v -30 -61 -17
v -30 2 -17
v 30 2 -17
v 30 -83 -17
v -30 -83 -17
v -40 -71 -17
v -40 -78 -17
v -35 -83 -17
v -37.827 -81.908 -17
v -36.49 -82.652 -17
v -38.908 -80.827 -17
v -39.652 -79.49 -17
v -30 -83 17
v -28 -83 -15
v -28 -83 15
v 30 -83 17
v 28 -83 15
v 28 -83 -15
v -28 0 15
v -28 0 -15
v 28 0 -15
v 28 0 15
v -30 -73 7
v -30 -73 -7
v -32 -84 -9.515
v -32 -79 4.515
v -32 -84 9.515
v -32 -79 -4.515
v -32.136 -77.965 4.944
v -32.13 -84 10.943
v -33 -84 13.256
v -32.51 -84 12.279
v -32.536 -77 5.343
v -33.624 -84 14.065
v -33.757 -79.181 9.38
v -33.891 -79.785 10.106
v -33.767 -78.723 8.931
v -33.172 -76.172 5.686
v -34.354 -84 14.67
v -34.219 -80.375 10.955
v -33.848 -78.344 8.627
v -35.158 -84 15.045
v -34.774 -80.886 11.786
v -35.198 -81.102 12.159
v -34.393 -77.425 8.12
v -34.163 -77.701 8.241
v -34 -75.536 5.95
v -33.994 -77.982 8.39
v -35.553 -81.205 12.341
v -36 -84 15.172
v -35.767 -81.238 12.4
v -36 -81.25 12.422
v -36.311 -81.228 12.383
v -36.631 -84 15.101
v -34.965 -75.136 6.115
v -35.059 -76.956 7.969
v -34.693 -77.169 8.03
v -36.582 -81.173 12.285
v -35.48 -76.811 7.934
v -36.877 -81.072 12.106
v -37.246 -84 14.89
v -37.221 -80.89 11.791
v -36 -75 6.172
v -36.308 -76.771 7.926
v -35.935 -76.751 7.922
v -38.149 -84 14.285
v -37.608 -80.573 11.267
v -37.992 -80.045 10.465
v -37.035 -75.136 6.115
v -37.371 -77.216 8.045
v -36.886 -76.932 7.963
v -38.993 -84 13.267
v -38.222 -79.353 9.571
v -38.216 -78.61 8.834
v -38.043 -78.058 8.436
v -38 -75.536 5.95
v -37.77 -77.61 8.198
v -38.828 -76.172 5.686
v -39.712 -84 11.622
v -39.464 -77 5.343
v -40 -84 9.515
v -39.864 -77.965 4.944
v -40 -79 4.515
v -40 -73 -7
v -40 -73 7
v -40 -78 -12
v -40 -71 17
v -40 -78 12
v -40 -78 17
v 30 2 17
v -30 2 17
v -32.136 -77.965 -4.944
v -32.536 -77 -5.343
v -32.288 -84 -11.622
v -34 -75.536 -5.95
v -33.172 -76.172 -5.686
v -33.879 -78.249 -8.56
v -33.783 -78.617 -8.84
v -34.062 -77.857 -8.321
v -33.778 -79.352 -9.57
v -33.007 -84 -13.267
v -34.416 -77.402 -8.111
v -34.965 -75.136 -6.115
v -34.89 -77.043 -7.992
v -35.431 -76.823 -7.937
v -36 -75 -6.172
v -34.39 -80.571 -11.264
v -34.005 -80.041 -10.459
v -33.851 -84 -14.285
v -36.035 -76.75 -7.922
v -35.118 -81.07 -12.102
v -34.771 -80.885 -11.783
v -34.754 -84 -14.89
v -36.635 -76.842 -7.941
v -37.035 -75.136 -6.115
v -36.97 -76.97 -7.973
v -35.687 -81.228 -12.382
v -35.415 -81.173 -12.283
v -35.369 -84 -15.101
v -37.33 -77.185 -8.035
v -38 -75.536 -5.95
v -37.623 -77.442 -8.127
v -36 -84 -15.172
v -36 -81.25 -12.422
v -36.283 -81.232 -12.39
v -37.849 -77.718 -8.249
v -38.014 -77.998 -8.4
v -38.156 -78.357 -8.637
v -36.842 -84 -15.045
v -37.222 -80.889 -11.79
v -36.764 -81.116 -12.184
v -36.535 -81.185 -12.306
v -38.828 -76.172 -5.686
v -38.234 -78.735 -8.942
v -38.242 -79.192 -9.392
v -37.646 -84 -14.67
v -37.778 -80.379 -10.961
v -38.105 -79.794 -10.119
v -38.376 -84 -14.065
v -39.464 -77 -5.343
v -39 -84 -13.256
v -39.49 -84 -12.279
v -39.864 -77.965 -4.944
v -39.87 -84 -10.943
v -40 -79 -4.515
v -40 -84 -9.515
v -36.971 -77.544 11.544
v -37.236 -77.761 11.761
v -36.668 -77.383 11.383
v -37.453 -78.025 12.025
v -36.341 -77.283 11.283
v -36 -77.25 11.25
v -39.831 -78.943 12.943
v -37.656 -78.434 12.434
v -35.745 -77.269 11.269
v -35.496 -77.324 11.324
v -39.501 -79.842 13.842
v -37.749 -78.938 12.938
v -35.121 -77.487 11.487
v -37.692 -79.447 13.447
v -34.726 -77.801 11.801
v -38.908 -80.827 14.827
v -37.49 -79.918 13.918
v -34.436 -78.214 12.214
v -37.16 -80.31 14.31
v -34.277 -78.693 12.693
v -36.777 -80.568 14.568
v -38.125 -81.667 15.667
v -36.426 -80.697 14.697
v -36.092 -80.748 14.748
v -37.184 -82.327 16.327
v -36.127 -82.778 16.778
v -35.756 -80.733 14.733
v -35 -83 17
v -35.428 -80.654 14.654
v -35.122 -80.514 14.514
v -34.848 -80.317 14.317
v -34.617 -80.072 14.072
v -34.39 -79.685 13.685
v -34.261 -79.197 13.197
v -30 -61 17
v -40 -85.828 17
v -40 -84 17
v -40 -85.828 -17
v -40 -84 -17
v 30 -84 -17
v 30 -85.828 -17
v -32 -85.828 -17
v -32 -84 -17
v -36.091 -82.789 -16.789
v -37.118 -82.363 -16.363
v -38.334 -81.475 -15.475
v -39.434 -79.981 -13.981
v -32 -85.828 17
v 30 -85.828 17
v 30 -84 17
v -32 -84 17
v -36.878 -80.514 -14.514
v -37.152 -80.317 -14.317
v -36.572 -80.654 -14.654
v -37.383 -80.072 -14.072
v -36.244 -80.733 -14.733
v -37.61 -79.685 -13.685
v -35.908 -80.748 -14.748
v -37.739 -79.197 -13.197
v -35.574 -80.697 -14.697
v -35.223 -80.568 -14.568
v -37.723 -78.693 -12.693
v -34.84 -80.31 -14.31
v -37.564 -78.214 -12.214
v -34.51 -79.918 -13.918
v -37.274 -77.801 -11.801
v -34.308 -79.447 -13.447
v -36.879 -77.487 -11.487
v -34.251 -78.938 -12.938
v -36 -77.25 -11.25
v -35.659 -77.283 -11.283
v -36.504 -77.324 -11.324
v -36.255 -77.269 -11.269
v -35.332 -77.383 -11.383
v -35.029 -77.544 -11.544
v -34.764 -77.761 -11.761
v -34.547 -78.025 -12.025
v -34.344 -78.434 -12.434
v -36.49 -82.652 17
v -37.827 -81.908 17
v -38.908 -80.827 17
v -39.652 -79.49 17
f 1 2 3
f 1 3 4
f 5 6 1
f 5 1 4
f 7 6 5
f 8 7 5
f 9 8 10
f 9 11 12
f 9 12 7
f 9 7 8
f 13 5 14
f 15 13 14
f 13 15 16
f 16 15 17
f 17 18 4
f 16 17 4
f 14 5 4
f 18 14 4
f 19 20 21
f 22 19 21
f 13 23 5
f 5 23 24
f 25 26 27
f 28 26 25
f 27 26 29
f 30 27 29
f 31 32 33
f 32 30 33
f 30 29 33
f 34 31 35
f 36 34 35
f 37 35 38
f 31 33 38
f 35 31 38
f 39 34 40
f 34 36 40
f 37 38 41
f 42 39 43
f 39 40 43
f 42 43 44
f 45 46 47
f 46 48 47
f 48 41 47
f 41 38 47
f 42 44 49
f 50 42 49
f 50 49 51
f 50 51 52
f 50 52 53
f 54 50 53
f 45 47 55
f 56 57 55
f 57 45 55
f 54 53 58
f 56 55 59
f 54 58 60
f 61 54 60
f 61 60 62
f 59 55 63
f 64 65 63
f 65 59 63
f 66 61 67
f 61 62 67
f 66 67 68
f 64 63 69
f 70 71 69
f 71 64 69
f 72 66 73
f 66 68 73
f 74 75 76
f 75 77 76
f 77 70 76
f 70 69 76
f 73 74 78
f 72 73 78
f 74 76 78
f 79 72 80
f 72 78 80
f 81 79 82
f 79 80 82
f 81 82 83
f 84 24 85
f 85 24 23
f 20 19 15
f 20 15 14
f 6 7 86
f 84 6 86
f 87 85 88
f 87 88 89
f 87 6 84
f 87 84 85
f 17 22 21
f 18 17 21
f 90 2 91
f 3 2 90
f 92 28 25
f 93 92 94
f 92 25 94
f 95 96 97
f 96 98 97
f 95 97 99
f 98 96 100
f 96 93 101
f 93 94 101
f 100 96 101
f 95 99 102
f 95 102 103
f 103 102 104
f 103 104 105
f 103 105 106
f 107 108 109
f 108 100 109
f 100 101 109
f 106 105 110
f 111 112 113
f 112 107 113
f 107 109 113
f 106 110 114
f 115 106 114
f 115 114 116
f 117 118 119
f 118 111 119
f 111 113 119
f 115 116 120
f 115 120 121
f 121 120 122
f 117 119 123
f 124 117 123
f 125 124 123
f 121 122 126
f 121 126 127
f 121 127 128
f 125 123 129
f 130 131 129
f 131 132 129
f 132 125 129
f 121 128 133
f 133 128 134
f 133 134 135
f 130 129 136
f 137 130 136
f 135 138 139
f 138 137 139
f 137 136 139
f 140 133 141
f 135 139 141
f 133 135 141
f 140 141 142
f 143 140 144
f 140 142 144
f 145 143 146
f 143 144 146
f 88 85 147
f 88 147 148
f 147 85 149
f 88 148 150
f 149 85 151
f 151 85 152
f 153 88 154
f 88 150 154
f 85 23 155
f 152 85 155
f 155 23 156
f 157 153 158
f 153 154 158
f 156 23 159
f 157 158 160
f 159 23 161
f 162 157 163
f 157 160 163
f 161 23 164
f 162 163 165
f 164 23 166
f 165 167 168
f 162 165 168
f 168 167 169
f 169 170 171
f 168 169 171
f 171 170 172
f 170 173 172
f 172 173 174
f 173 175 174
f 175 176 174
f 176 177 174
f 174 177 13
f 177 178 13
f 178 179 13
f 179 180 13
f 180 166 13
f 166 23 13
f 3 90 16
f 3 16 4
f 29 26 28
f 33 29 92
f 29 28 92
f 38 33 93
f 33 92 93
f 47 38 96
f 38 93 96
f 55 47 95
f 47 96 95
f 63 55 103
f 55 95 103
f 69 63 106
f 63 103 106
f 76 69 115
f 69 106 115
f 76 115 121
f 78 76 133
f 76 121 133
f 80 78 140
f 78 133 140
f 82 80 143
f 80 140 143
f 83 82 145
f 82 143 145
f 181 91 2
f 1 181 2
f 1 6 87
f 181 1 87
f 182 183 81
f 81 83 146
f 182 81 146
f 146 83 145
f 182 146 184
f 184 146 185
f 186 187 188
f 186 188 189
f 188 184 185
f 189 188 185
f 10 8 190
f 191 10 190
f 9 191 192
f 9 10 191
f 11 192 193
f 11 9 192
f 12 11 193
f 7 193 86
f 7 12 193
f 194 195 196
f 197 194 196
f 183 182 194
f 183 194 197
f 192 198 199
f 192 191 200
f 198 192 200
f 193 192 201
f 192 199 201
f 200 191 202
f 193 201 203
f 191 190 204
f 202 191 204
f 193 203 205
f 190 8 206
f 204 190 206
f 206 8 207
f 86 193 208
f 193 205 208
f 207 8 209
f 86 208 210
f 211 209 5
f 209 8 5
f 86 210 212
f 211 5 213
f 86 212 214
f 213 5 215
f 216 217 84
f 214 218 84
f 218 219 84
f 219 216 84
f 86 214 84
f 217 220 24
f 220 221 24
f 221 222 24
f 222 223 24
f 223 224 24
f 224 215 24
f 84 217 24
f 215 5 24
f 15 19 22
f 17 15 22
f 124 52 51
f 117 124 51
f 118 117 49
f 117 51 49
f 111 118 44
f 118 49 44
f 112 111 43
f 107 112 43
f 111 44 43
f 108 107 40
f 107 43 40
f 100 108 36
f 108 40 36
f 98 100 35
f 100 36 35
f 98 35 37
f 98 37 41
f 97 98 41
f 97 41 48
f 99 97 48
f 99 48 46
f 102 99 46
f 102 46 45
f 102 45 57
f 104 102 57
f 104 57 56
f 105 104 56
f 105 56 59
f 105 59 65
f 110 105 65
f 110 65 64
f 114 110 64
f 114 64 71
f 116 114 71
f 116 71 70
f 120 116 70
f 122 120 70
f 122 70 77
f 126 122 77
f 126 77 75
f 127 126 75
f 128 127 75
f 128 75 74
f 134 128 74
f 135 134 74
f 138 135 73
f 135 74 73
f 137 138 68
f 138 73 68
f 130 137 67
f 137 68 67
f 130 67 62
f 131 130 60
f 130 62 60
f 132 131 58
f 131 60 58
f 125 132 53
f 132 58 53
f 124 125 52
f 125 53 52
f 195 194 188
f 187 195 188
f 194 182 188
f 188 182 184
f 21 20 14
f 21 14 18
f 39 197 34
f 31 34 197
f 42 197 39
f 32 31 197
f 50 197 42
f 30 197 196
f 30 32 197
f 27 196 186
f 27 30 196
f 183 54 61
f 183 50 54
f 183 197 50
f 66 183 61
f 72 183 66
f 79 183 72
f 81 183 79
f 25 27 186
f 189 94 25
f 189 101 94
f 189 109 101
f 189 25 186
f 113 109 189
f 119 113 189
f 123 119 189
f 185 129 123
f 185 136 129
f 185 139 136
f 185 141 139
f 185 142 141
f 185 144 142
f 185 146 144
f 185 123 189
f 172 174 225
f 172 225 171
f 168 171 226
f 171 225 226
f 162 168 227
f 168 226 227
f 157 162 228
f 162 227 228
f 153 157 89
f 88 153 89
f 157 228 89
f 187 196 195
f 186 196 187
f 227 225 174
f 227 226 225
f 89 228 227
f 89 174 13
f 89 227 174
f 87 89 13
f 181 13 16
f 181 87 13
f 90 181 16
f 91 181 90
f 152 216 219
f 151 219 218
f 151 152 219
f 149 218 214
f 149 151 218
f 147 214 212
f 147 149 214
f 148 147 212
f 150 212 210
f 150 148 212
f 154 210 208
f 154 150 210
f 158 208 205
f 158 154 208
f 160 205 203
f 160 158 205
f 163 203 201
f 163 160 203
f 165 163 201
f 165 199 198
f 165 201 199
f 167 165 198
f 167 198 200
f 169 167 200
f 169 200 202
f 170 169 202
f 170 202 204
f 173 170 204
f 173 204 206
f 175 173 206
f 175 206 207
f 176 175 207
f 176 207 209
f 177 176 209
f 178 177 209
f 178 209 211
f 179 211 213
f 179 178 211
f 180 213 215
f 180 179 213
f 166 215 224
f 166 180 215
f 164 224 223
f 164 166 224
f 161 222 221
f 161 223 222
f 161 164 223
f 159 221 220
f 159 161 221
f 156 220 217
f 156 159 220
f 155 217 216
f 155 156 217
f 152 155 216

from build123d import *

# Parameters (mm, degrees)
SKETCH1_W            = 56
SKETCH1_H            = 30
BOSS_EXTRUDE1_DEPTH  = 2
SKETCH2_W            = 60
SKETCH2_H            = 34
SKETCH2_W_2          = 56
SKETCH2_H_2          = 30
BOSS_EXTRUDE2_DEPTH  = 85
BOSS_EXTRUDE3_DEPTH  = 10
SKETCH5_W            = 34
SKETCH5_H            = 2
BOSS_EXTRUDE5_DEPTH  = 10
CHAMFER2_SIZE        = 10
BOSS_EXTRUDE6_START  = 2
BOSS_EXTRUDE6_DEPTH  = 8
SKETCH7_R            = 2.25
CUT_EXTRUDE1_DEPTH   = 99.208960895
BOSS_EXTRUDE7_REACH  = 100.209
SKETCH9_R            = 2.25
BOSS_EXTRUDE8_REACH  = 100.209
SKETCH10_R           = 2.25
BOSS_EXTRUDE9_REACH  = 100.209
SKETCH11_R           = 1.75
SKETCH12_W           = 8
SKETCH12_H           = 28.34314575
BOSS_EXTRUDE10_DEPTH = 1
BOSS_EXTRUDE11_DEPTH = 8
SKETCH14_W           = 34
SKETCH14_H           = 1.828427125
BOSS_EXTRUDE12_DEPTH = 62
FILLET1_R            = 4
CUT_EXTRUDE2_REACH   = 102.611
CUT_EXTRUDE3_REACH   = 102.611


# Some blends are built 0.0001 mm under size
with BuildPart() as part:
    # Sketch1 → Boss-Extrude1 (new body)
    with BuildSketch(Plane(origin=(0, 0, 0), x_dir=(1, 0, 0), z_dir=(0, 1, 0))):
        Rectangle(SKETCH1_W, SKETCH1_H)
    extrude(amount=BOSS_EXTRUDE1_DEPTH)

    # Sketch2 → Boss-Extrude2 (add)
    with BuildSketch(Plane(origin=(0, 2, 0), x_dir=(1, 0, 0), z_dir=(0, 1, 0))):
        Rectangle(SKETCH2_W, SKETCH2_H)
        Rectangle(SKETCH2_W_2, SKETCH2_H_2, mode=Mode.SUBTRACT)
    extrude(amount=-BOSS_EXTRUDE2_DEPTH)

    # Sketch3 → Boss-Extrude3 (add)
    with BuildSketch(Plane.ZY.offset(30)):
        Polygon((17, -83), (17, -73), (7.299704714, -73), (7, -73), (7.299704714, -73.299704714), align=None)
        Polygon((-17, -73), (-17, -83), (-10.046245332, -76.046245332), (-7.299704714, -73.299704714), (-7, -73), (-7.299704714, -73), align=None)
    extrude(amount=BOSS_EXTRUDE3_DEPTH)

    # Sketch5 → Boss-Extrude5 (add)
    with BuildSketch(Plane.ZY.offset(30)):
        with Locations((0, -72)):
            Rectangle(SKETCH5_W, SKETCH5_H)
    extrude(amount=BOSS_EXTRUDE5_DEPTH)

    # Chamfer2
    chamfer2_edges = [part.edges().sort_by_distance(p)[0] for p in [
        (-30, -71, 0),
    ]]
    chamfer(chamfer2_edges, length=CHAMFER2_SIZE - 0.0001)  # a hair under: the kernel refuses the full size


with BuildPart() as body_2:
    # Sketch6 → Boss-Extrude6 (new body)
    with BuildSketch(Plane.ZY.offset(30).offset(BOSS_EXTRUDE6_START)):
        Polygon((12.171572875, -81), (14.171572875, -83), (-14.171572875, -83), (-12.171572875, -81), (-6.171572875, -75), (6.171572875, -75), align=None)
    extrude(amount=BOSS_EXTRUDE6_DEPTH)


with BuildPart() as cut_extrude1_tool:
    # Sketch7 → Cut-Extrude1 (new, through all)
    with BuildSketch(Plane.XY.offset(17)):
        with Locations(Location((-36, -79, 0), (0, 0, 270))):
            Circle(SKETCH7_R)
    extrude(amount=-CUT_EXTRUDE1_DEPTH)


with BuildPart() as part_1:
    add(part.part)

    # Cut-Extrude1: cut by cut_extrude1_tool
    add(cut_extrude1_tool.part, mode=Mode.SUBTRACT)

    # Boss-Extrude7: up to this face of the body (flat: up to its plane)
    boss_extrude7_end = Plane(part_1.part.faces().sort_by_distance((-35, -73.122474487, 7.122474487))[0])
    # Sketch9 → Boss-Extrude7 (add, up to the picked face)
    with BuildSketch(Plane.XY.offset(17), mode=Mode.PRIVATE) as boss_extrude7_sk1:
        with Locations(Location((-36, -79, 0), (0, 0, 270))):
            Circle(SKETCH9_R)
    boss_extrude7_tool1 = split(extrude(boss_extrude7_sk1.sketch, amount=-BOSS_EXTRUDE7_REACH, mode=Mode.PRIVATE), bisect_by=boss_extrude7_end, keep=Keep.BOTH, mode=Mode.PRIVATE)
    add(boss_extrude7_tool1.solids().sort_by(Axis((-36, -79, 17), (0, 0, -1)))[0])

    # Boss-Extrude8: up to this face of the body (flat: up to its plane)
    boss_extrude8_end = Plane(part_1.part.faces().sort_by_distance((-35, -82.877525513, -16.877525513))[0])
    # Sketch10 → Boss-Extrude8 (add, up to the picked face)
    with BuildSketch(Plane(origin=(0, 0, -17), x_dir=(-1, 0, 0), z_dir=(0, 0, -1)), mode=Mode.PRIVATE) as boss_extrude8_sk1:
        with Locations(Location((36, -79, 0), (0, 0, 270))):
            Circle(SKETCH10_R)
    boss_extrude8_tool1 = split(extrude(boss_extrude8_sk1.sketch, amount=-BOSS_EXTRUDE8_REACH, mode=Mode.PRIVATE), bisect_by=boss_extrude8_end, keep=Keep.BOTH, mode=Mode.PRIVATE)
    add(boss_extrude8_tool1.solids().sort_by(Axis((-36, -79, -17), (0, 0, 1)))[0])

    # Boss-Extrude9: up to this plane
    boss_extrude9_end = Plane(origin=(-40, -73.299704714, -7.299704714), z_dir=(0, 0.7071067811867726, -0.7071067811863224))
    # Sketch11 → Boss-Extrude9 (add, up to the surface)
    with BuildSketch(Plane.XY.offset(17), mode=Mode.PRIVATE) as boss_extrude9_sk1:
        with Locations(Location((-36, -79, 0), (0, 0, 90))):
            Circle(SKETCH11_R)
    boss_extrude9_tool1 = split(extrude(boss_extrude9_sk1.sketch, amount=-BOSS_EXTRUDE9_REACH, mode=Mode.PRIVATE), bisect_by=boss_extrude9_end, keep=Keep.BOTH, mode=Mode.PRIVATE)
    add(boss_extrude9_tool1.solids().sort_by_distance((-36, -79, 17))[0])

    # Cut-Extrude2: up to this face of the body (flat: up to its plane)
    cut_extrude2_end = Plane(part_1.part.faces().sort_by_distance((-35, -73.122474487, 7.122474487))[0])
    # Sketch15 → Cut-Extrude2 (cut, up to the picked face)
    with BuildSketch(Plane.XY.offset(17), mode=Mode.PRIVATE) as cut_extrude2_sk1:
        with BuildLine():
            Line((-40, -77), (-40.95825687, -78.42919066))
            Line((-40.95825687, -78.42919066), (-40.221590292, -83.192087083))
            Line((-40.221590292, -83.192087083), (-35, -83))
            ThreePointArc((-35, -83), (-38.742640687, -81.035533906), (-40, -77))
        make_face()
    cut_extrude2_tool1 = split(extrude(cut_extrude2_sk1.sketch, amount=-CUT_EXTRUDE2_REACH, mode=Mode.PRIVATE), bisect_by=cut_extrude2_end, keep=Keep.BOTH, mode=Mode.PRIVATE)
    add(cut_extrude2_tool1.solids().sort_by(Axis((-39.293992, -81.193601, 17), (0, 0, -1)))[0], mode=Mode.SUBTRACT)

    # Cut-Extrude3: up to this face of the body (flat: up to its plane)
    cut_extrude3_end = Plane(part_1.part.faces().sort_by_distance((-35, -82.877525513, -16.877525513))[0])
    # Sketch16 → Cut-Extrude3 (cut, up to the picked face)
    with BuildSketch(Plane(origin=(0, 0, -17), x_dir=(-1, 0, 0), z_dir=(0, 0, -1)), mode=Mode.PRIVATE) as cut_extrude3_sk1:
        with BuildLine():
            Line((40, -77), (40.921238038, -77.921238038))
            Line((40.921238038, -77.921238038), (40.171531484, -83.209136239))
            Line((40.171531484, -83.209136239), (35, -83))
            ThreePointArc((35, -83), (38.742640687, -81.035533906), (40, -77))
        make_face()
    cut_extrude3_tool1 = split(extrude(cut_extrude3_sk1.sketch, amount=-CUT_EXTRUDE3_REACH, mode=Mode.PRIVATE), bisect_by=cut_extrude3_end, keep=Keep.BOTH, mode=Mode.PRIVATE)
    add(cut_extrude3_tool1.solids().sort_by(Axis((-39.266002, -81.163478, -17), (0, 0, 1)))[0], mode=Mode.SUBTRACT)


with BuildPart() as body_2_1:
    add(body_2.part)

    # Cut-Extrude1: cut by cut_extrude1_tool
    add(cut_extrude1_tool.part, mode=Mode.SUBTRACT)

    # Sketch12 → Boss-Extrude10 (add)
    with BuildSketch(Plane.XZ.offset(83)):
        with Locations((-36, 0)):
            Rectangle(SKETCH12_W, SKETCH12_H)
    extrude(amount=BOSS_EXTRUDE10_DEPTH)

    # Sketch13 → Boss-Extrude11 (add)
    with BuildSketch(Plane.ZY.offset(40)):
        Polygon((17, -85.828427125), (-17, -85.828427125), (-17, -84), (-15.171572875, -84), (-14.171572875, -83), (-14.171572875, -84), (14.171572875, -84), (14.171572875, -83), (15.171572875, -84), (17, -84), align=None)
    extrude(amount=-BOSS_EXTRUDE11_DEPTH)

    # Sketch14 → Boss-Extrude12 (add)
    with BuildSketch(Plane(origin=(-32, 0, 0), x_dir=(0, 0, -1), z_dir=(1, 0, 0))):
        with Locations((0, -84.914213563)):
            Rectangle(SKETCH14_W, SKETCH14_H)
    extrude(amount=BOSS_EXTRUDE12_DEPTH)

    # Fillet1
    # the kernel refuses this fillet: 4 mm, written as the material it takes off along each edge
    with BuildSketch(Plane(origin=(-40, -67.928932188, -0.899494937), x_dir=(1, 0, 0), z_dir=(0, -0.7071067811865429, 0.7071067811865522))) as fillet1_piece_1_section:
        with BuildLine():
            CenterArc((FILLET1_R, -FILLET1_R), FILLET1_R, 90, 90)
            Line((0, -FILLET1_R), (0, 0))
            Line((0, 0), (FILLET1_R, 0))
        make_face()
    fillet1_piece_1 = extrude(amount=32.727922061, mode=Mode.PRIVATE)
    fillet1_piece_1 = split(fillet1_piece_1, bisect_by=Plane(origin=(-39.176171252, -84, 9.384724786), z_dir=(0, 1, 0)), keep=Keep.TOP, mode=Mode.PRIVATE)
    add(fillet1_piece_1, mode=Mode.SUBTRACT)
    with BuildSketch(Plane(origin=(-32, -91.071067812, 22.242640687), x_dir=(-1, 0, 0), z_dir=(0, 0.7071067811865429, -0.7071067811865522))) as fillet1_piece_2_section:
        with BuildLine():
            CenterArc((FILLET1_R, -FILLET1_R), FILLET1_R, 90, 90)
            Line((0, -FILLET1_R), (0, 0))
            Line((0, 0), (FILLET1_R, 0))
        make_face()
    fillet1_piece_2 = extrude(amount=32.727922061, mode=Mode.PRIVATE)
    fillet1_piece_2 = split(fillet1_piece_2, bisect_by=Plane(origin=(-32.823830813, -84, 9.384729288), z_dir=(0, 1, 0)), keep=Keep.TOP, mode=Mode.PRIVATE)
    add(fillet1_piece_2, mode=Mode.SUBTRACT)
    with BuildSketch(Plane(origin=(-32, -91.071067812, -22.242640687), x_dir=(-1, 0, 0), z_dir=(0, 0.7071067811865529, 0.7071067811865422))) as fillet1_piece_3_section:
        with BuildLine():
            CenterArc((FILLET1_R, FILLET1_R), FILLET1_R, 180, 90)
            Line((0, FILLET1_R), (0, 0))
            Line((0, 0), (FILLET1_R, 0))
        make_face()
    fillet1_piece_3 = extrude(amount=32.727922061, mode=Mode.PRIVATE)
    fillet1_piece_3 = split(fillet1_piece_3, bisect_by=Plane(origin=(-32.823830813, -84, -9.384729288), z_dir=(0, 1, 0)), keep=Keep.TOP, mode=Mode.PRIVATE)
    add(fillet1_piece_3, mode=Mode.SUBTRACT)
    with BuildSketch(Plane(origin=(-40, -67.928932188, 0.899494937), x_dir=(1, 0, 0), z_dir=(0, -0.7071067811865529, -0.7071067811865422))) as fillet1_piece_4_section:
        with BuildLine():
            CenterArc((FILLET1_R, FILLET1_R), FILLET1_R, 180, 90)
            Line((0, FILLET1_R), (0, 0))
            Line((0, 0), (FILLET1_R, 0))
        make_face()
    fillet1_piece_4 = extrude(amount=32.727922061, mode=Mode.PRIVATE)
    fillet1_piece_4 = split(fillet1_piece_4, bisect_by=Plane(origin=(-39.176171252, -84, -9.384724786), z_dir=(0, 1, 0)), keep=Keep.TOP, mode=Mode.PRIVATE)
    add(fillet1_piece_4, mode=Mode.SUBTRACT)
    with BuildSketch(Plane(origin=(-40, -75, -16.171572875), x_dir=(0, -1, 0), z_dir=(0, 0, 1))) as fillet1_piece_5:
        with BuildLine():
            CenterArc((FILLET1_R, FILLET1_R), FILLET1_R, 180, 90)
            Line((0, FILLET1_R), (0, 0))
            Line((0, 0), (FILLET1_R, 0))
        make_face()
    extrude(amount=32.343145751, mode=Mode.SUBTRACT)
    with BuildSketch(Plane(origin=(-32, -75, -16.171572875), x_dir=(0, -1, 0), z_dir=(0, 0, 1))) as fillet1_piece_6:
        with BuildLine():
            CenterArc((FILLET1_R, -FILLET1_R), FILLET1_R, 90, 90)
            Line((0, -FILLET1_R), (0, 0))
            Line((0, 0), (FILLET1_R, 0))
        make_face()
    extrude(amount=32.343145751, mode=Mode.SUBTRACT)


solid = Compound([part_1.part, body_2_1.part])
